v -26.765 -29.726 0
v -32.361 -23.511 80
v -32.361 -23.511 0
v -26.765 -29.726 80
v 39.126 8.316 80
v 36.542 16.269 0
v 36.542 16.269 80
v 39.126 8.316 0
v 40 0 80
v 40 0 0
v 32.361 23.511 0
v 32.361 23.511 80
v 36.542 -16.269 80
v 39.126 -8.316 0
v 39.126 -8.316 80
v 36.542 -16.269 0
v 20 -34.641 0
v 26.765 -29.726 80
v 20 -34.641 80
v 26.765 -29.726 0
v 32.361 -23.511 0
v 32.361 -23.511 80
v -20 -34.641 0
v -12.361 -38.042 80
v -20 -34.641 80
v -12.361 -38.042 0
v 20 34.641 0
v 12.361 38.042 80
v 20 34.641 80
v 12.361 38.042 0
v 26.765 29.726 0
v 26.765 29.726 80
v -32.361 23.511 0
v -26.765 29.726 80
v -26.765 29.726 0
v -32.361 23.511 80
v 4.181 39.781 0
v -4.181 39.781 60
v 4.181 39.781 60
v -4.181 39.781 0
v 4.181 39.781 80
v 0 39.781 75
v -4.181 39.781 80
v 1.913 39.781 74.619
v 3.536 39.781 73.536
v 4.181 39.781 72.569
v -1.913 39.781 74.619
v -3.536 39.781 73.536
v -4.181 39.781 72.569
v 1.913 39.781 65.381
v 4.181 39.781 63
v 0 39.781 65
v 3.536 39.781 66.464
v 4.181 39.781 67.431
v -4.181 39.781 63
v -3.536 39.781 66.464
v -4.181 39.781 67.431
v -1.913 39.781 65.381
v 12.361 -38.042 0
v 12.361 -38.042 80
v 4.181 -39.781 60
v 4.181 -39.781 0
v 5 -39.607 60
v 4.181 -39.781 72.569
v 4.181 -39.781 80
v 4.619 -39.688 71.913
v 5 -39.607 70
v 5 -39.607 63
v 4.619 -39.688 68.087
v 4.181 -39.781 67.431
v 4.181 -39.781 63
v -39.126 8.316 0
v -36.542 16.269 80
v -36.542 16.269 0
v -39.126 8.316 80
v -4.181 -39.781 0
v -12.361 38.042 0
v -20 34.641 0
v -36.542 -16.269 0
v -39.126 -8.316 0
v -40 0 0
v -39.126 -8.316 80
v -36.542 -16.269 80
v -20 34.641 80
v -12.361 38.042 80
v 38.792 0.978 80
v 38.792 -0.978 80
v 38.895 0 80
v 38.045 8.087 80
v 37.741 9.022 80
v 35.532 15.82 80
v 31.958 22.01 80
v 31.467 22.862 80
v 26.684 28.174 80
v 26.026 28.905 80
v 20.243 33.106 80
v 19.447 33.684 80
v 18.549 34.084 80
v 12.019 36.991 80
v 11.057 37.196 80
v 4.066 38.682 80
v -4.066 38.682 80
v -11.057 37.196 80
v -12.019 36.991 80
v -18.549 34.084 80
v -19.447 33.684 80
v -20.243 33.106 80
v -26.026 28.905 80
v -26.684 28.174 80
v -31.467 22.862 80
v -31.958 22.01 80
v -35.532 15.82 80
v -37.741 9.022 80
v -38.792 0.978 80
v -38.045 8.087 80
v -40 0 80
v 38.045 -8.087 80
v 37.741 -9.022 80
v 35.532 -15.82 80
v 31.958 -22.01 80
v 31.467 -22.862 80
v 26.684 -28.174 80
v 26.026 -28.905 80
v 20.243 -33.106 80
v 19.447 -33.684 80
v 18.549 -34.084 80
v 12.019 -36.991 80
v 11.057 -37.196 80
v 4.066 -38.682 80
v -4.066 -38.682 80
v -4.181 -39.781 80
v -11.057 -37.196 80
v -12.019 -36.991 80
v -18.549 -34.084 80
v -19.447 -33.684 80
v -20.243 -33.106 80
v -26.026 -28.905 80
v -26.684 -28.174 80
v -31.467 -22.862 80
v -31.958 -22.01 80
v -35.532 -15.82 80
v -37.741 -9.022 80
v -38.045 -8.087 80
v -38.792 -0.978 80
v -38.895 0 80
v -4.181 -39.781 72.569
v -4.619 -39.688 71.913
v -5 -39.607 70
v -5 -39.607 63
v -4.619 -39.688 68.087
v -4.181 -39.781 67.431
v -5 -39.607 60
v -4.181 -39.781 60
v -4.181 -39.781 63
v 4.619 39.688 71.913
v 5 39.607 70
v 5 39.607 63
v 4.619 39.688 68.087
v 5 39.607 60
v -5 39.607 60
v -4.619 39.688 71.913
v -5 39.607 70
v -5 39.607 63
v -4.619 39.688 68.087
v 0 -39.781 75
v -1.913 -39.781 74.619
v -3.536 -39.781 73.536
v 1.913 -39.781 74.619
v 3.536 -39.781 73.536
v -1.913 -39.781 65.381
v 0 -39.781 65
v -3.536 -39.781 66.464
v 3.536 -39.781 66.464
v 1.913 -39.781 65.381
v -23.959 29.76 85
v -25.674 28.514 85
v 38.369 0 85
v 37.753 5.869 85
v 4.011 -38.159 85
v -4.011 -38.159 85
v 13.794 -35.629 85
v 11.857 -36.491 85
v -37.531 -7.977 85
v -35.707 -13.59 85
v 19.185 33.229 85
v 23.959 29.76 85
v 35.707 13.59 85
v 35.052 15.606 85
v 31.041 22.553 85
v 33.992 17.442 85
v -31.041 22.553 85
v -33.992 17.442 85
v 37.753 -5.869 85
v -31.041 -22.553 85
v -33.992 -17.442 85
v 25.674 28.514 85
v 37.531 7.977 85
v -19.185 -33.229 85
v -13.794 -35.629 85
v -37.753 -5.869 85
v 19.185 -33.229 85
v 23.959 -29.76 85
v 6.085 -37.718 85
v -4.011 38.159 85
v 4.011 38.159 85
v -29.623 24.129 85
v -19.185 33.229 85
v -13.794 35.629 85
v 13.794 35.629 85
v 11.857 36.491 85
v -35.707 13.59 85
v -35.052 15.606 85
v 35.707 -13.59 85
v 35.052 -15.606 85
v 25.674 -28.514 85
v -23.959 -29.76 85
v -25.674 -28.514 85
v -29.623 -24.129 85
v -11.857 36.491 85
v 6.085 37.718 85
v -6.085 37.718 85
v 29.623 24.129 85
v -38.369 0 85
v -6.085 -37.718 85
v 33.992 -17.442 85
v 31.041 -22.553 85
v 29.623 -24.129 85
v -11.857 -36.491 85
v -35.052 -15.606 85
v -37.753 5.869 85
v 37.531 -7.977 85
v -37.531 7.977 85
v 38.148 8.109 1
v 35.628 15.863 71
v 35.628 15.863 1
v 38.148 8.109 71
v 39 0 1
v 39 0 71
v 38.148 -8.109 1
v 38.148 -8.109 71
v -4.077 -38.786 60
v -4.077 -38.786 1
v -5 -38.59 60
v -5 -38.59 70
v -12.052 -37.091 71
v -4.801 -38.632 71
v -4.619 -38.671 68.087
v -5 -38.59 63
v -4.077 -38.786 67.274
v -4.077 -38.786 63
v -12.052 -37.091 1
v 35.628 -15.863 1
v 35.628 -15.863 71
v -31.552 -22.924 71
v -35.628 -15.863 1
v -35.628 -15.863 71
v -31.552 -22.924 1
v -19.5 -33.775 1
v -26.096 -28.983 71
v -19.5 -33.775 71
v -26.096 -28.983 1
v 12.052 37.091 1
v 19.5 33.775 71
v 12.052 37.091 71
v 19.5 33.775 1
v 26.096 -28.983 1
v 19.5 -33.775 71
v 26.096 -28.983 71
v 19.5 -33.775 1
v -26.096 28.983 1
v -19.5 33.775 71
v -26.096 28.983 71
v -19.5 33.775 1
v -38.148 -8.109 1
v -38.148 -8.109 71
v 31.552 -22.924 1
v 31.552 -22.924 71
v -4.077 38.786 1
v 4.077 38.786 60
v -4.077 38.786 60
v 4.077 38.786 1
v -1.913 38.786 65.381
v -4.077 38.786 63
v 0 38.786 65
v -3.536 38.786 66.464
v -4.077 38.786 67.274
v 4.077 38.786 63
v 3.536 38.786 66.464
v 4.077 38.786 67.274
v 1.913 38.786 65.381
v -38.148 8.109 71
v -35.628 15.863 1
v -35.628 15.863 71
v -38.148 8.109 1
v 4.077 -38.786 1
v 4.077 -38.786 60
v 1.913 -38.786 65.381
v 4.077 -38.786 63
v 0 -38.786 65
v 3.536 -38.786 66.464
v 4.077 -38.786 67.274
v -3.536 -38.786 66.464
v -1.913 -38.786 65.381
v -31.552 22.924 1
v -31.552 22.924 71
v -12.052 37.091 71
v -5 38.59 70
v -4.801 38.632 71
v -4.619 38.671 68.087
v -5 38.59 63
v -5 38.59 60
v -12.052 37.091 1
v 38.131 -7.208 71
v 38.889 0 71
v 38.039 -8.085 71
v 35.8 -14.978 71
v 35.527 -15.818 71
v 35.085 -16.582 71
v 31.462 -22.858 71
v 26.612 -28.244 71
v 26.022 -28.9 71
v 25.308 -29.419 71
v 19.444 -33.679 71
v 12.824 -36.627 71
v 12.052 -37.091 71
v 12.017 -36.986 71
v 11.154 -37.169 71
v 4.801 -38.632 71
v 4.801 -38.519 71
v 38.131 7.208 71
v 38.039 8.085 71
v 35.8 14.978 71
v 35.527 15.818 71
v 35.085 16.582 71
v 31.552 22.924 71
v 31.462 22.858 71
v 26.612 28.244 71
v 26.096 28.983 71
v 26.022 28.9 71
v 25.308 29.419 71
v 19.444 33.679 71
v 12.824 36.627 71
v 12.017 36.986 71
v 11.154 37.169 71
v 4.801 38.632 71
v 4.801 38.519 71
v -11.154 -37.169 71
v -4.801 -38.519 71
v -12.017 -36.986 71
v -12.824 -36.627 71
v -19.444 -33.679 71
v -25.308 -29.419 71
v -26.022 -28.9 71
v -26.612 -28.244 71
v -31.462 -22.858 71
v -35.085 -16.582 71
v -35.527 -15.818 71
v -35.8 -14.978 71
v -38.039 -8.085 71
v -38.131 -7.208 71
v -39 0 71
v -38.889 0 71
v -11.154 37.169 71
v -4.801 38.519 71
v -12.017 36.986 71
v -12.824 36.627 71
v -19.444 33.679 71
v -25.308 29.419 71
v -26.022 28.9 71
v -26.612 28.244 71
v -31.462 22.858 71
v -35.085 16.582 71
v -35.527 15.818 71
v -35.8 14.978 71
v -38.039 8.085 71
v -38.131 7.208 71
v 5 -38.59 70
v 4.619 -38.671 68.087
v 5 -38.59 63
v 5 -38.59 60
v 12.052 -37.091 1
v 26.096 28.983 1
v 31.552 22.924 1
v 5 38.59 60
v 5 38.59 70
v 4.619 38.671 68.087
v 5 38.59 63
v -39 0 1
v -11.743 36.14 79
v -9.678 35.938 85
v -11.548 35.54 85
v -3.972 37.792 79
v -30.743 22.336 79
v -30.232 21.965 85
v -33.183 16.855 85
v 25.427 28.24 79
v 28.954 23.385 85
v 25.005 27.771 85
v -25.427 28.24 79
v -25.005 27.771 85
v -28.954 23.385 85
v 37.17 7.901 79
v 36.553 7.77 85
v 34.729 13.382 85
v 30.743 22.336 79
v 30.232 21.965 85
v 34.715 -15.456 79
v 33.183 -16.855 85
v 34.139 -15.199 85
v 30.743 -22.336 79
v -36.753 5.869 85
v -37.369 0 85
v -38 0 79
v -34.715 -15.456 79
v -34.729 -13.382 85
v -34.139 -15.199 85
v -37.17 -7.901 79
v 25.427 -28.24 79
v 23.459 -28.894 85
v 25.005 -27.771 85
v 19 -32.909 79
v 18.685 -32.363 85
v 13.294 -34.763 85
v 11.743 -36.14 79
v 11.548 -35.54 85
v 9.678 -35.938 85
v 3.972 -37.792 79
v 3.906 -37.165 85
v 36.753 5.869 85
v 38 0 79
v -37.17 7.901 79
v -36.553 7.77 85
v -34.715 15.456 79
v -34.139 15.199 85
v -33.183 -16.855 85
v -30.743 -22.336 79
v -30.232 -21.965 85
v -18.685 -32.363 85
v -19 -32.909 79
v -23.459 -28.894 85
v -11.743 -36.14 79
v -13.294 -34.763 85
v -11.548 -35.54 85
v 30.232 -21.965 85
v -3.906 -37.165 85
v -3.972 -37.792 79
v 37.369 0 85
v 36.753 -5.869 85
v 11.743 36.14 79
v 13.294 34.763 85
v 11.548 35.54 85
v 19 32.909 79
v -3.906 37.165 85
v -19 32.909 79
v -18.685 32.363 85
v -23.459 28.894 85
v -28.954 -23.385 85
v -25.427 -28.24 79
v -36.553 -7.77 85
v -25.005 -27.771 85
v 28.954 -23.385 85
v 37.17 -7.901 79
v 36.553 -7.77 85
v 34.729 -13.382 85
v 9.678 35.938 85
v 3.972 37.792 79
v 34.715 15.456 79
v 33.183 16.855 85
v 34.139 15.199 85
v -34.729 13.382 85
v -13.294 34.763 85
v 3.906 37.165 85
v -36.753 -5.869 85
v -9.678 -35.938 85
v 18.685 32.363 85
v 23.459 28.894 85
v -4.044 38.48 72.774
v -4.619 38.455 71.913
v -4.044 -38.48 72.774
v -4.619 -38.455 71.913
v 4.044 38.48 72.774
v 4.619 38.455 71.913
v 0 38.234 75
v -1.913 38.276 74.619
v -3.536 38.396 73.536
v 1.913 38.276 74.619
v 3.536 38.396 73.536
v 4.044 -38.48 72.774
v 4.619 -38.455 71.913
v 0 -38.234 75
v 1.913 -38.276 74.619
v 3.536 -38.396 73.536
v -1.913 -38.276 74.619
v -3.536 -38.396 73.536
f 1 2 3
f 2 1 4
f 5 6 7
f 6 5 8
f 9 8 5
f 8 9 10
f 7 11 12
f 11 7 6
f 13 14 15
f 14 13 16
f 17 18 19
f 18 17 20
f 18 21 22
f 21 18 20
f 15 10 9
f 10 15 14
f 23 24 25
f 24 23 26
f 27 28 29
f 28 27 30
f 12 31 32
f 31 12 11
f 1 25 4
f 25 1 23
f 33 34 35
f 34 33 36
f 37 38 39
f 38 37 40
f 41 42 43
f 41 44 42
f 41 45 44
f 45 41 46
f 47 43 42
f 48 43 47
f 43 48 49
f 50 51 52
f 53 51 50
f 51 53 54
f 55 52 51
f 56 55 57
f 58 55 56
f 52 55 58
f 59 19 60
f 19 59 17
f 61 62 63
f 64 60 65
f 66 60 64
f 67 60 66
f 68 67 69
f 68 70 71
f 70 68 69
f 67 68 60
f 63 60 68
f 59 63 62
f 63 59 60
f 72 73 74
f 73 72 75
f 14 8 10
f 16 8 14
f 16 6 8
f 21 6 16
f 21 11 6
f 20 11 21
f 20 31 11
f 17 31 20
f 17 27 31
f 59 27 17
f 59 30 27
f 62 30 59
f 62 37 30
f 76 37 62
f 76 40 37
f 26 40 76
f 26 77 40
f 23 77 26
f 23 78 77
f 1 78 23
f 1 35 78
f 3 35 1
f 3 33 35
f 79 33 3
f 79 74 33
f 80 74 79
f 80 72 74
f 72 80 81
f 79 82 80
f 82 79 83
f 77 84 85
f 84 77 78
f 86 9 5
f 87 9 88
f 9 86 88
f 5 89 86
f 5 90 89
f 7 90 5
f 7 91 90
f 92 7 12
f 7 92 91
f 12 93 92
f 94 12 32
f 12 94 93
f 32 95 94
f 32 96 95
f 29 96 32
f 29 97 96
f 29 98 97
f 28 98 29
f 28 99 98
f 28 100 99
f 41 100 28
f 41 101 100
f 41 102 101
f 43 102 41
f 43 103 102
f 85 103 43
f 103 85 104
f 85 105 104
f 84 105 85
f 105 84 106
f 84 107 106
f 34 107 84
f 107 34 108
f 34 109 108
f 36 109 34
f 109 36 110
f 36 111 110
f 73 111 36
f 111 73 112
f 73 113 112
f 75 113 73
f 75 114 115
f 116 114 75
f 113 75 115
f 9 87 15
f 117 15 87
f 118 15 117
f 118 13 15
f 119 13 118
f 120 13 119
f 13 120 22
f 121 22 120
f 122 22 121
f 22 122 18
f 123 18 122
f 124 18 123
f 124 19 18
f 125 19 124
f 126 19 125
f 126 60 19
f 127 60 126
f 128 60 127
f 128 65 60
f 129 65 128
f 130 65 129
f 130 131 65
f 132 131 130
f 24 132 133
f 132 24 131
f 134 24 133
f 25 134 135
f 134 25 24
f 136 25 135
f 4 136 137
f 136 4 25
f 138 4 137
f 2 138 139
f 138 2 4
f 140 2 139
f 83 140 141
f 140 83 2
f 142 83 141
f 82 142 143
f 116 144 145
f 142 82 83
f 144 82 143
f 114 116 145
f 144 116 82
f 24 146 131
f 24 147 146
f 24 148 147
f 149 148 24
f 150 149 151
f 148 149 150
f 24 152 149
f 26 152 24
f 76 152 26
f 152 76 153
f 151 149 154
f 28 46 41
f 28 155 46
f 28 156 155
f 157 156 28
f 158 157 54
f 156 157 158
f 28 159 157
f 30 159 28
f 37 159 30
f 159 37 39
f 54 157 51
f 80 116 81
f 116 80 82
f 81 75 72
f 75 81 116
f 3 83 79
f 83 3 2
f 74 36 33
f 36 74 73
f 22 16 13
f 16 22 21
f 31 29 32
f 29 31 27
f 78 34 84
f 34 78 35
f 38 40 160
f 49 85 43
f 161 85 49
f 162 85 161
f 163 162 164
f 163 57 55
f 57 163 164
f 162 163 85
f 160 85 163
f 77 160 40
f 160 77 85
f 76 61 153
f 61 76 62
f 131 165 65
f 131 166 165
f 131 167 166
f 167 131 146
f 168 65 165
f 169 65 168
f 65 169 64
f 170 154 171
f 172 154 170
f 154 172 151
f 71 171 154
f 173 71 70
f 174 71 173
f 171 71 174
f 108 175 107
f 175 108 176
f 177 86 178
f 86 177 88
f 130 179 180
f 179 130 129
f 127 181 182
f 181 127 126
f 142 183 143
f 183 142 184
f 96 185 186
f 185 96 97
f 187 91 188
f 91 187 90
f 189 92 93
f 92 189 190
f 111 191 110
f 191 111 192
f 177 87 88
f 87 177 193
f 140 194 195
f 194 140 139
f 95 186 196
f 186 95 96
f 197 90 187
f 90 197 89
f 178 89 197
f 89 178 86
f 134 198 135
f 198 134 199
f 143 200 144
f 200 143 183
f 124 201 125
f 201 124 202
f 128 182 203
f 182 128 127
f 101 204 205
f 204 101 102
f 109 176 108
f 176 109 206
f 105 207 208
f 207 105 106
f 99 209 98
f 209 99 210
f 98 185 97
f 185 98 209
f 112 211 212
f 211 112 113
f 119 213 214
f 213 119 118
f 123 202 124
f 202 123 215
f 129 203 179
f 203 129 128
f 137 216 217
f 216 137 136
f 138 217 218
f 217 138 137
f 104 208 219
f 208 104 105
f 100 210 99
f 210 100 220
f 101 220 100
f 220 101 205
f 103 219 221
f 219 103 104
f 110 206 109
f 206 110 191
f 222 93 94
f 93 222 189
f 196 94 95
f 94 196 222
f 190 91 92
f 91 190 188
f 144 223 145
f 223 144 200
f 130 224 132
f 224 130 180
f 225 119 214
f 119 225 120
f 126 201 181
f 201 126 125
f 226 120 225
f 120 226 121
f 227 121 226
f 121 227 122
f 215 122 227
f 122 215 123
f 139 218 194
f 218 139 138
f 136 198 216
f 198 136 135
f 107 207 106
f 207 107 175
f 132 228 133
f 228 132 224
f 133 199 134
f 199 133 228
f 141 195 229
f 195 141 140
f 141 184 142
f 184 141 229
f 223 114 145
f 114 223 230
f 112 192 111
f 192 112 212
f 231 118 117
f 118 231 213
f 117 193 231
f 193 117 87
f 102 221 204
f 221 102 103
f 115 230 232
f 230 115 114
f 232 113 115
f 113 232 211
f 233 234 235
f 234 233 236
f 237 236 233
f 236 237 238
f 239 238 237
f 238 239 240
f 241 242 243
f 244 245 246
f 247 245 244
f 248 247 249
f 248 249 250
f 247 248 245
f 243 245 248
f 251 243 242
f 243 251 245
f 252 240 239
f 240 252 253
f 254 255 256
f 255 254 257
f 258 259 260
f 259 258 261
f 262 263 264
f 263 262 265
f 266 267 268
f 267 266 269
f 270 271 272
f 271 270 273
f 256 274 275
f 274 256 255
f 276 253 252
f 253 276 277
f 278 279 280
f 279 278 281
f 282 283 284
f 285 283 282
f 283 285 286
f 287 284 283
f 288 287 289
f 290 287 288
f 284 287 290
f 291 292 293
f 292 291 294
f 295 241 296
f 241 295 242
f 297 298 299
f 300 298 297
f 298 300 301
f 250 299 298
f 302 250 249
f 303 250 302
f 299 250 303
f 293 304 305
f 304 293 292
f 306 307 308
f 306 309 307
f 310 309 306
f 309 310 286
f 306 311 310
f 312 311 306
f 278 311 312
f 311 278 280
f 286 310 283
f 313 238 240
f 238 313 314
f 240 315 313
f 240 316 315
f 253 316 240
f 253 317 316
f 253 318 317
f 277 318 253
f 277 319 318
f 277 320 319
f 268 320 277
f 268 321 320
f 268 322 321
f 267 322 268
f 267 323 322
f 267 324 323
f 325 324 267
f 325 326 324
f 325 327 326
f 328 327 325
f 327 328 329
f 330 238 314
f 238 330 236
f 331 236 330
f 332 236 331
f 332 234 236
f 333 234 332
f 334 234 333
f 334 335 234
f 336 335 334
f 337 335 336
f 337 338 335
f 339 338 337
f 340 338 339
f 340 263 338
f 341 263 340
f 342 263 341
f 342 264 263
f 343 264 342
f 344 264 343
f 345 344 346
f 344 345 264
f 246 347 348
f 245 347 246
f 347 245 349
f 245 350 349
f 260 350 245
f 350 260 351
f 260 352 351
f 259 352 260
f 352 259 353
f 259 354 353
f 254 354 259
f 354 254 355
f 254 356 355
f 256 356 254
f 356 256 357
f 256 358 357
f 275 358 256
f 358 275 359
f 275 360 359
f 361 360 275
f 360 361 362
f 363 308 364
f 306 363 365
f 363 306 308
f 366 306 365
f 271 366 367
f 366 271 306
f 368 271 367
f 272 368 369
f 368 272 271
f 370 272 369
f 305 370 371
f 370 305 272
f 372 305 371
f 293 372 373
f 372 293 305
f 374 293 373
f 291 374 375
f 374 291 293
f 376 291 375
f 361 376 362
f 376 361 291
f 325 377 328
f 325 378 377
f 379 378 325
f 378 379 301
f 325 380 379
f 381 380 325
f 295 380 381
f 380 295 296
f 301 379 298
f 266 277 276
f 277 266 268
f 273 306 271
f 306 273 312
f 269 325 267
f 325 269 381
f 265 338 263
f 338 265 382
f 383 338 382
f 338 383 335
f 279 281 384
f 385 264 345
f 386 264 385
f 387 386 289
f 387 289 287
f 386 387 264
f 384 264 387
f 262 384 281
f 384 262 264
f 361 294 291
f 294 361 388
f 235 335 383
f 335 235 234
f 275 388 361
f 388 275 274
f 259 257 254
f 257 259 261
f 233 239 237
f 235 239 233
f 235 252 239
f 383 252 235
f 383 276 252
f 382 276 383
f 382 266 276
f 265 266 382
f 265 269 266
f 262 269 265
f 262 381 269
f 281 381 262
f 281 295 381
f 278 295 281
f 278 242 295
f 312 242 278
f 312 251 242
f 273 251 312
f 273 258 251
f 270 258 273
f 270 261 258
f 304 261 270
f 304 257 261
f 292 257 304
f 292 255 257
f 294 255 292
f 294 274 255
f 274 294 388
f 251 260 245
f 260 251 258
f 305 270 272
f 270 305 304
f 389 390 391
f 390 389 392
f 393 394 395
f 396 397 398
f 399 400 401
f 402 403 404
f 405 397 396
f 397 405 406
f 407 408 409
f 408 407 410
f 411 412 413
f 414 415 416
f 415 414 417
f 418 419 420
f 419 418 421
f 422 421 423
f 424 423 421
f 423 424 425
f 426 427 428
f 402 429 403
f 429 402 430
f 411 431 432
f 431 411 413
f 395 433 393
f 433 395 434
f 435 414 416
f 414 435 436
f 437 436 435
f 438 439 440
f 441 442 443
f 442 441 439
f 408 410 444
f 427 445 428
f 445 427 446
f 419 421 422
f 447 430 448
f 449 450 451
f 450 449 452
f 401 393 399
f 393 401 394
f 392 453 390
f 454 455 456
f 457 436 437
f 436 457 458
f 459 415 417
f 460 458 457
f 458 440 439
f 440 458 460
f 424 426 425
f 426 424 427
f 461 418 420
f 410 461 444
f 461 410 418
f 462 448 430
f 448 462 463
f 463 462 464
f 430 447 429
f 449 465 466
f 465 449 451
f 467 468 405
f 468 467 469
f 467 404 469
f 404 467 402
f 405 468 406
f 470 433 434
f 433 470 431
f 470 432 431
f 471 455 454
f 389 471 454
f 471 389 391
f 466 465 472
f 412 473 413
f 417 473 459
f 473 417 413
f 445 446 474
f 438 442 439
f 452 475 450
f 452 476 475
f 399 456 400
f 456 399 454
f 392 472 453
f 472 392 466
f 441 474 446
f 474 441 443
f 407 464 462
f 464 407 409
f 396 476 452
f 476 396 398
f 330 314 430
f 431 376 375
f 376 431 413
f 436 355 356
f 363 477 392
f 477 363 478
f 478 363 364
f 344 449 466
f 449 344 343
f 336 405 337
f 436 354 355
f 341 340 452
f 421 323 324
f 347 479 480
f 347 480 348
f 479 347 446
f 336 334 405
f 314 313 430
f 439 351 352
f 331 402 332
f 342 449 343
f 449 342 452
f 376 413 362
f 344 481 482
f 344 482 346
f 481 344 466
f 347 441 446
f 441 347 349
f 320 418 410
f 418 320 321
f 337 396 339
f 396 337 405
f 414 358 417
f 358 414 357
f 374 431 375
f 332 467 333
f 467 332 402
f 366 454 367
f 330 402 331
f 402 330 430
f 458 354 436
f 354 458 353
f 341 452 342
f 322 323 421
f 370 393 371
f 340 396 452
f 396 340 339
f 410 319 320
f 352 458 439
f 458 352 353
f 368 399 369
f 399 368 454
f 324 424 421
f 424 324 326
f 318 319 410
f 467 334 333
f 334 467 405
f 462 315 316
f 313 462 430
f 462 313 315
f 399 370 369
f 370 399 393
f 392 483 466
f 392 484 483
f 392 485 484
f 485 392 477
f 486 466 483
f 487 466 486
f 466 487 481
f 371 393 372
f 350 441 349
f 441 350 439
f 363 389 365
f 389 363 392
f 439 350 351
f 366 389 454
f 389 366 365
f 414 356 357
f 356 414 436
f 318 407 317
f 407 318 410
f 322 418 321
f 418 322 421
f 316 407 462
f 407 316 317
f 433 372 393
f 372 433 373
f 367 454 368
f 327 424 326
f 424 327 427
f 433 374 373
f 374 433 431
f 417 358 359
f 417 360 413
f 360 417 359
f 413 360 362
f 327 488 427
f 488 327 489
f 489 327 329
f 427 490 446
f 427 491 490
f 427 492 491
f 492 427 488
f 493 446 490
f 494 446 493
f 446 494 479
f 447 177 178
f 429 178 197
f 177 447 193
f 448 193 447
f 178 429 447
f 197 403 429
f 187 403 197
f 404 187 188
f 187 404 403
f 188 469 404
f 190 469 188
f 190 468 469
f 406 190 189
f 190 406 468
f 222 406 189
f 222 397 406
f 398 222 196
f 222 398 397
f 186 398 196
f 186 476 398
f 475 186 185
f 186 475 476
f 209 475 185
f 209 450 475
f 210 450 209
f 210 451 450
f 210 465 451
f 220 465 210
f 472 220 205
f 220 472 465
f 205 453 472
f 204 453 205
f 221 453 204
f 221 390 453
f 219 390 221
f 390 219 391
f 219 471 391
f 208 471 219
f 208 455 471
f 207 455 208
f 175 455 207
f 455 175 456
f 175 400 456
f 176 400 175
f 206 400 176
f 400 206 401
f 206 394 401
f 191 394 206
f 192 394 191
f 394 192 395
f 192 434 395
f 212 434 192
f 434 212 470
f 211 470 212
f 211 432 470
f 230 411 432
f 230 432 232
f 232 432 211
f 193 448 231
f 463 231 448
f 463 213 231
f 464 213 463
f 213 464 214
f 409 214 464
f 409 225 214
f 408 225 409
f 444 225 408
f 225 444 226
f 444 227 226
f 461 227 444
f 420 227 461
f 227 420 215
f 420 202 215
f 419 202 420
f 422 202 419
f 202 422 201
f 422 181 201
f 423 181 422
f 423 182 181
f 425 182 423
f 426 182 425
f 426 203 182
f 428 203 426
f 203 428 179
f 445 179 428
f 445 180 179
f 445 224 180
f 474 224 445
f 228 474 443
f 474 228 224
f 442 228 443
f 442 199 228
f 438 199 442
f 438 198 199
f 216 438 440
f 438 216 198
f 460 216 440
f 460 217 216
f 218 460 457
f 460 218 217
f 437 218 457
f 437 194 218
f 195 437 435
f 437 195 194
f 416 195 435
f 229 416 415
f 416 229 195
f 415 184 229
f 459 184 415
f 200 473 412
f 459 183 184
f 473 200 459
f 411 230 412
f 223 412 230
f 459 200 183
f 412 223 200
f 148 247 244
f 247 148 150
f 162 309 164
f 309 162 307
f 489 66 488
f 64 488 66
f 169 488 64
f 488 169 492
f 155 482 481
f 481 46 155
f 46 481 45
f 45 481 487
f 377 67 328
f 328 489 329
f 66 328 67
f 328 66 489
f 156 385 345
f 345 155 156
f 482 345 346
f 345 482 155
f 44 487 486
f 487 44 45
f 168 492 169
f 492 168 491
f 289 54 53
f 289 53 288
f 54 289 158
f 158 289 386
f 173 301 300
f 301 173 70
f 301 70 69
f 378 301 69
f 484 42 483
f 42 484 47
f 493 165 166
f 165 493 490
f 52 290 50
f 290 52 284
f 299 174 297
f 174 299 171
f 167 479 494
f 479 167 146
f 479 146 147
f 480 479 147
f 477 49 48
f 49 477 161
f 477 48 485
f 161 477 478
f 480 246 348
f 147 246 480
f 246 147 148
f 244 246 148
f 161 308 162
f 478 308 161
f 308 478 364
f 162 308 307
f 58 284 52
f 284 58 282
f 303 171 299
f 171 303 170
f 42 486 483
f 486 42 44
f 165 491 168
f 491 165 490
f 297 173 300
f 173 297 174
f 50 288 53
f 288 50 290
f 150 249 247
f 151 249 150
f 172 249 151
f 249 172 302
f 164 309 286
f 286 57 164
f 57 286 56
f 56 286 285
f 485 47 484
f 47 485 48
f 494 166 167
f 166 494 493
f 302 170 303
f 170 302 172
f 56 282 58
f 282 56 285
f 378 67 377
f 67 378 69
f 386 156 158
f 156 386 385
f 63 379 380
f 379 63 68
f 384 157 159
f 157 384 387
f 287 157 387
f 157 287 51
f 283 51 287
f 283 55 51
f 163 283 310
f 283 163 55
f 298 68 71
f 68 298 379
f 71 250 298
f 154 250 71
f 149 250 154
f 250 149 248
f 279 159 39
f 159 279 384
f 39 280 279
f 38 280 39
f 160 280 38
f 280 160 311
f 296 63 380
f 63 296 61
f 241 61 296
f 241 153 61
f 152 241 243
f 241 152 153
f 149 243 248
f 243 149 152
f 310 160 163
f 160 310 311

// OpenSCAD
difference()
{
    union()
    {
        cylinder(r=40,h=80);
        translate([0,0,79])sphere(r=39);
    }
translate([0,0,1])cylinder(r=39,h=70);
    
translate([0,0,79])sphere(r=38);
translate([0,0,70])cylinder(r1=39,r2=38,h=9);
translate([-40,-40,85])cube([80,80,80]);
    
translate([0,40,70])rotate([90,0,0])cylinder(r=5,h=80);

translate([-5,-50,60])cube([10,100,3]);
    
}
